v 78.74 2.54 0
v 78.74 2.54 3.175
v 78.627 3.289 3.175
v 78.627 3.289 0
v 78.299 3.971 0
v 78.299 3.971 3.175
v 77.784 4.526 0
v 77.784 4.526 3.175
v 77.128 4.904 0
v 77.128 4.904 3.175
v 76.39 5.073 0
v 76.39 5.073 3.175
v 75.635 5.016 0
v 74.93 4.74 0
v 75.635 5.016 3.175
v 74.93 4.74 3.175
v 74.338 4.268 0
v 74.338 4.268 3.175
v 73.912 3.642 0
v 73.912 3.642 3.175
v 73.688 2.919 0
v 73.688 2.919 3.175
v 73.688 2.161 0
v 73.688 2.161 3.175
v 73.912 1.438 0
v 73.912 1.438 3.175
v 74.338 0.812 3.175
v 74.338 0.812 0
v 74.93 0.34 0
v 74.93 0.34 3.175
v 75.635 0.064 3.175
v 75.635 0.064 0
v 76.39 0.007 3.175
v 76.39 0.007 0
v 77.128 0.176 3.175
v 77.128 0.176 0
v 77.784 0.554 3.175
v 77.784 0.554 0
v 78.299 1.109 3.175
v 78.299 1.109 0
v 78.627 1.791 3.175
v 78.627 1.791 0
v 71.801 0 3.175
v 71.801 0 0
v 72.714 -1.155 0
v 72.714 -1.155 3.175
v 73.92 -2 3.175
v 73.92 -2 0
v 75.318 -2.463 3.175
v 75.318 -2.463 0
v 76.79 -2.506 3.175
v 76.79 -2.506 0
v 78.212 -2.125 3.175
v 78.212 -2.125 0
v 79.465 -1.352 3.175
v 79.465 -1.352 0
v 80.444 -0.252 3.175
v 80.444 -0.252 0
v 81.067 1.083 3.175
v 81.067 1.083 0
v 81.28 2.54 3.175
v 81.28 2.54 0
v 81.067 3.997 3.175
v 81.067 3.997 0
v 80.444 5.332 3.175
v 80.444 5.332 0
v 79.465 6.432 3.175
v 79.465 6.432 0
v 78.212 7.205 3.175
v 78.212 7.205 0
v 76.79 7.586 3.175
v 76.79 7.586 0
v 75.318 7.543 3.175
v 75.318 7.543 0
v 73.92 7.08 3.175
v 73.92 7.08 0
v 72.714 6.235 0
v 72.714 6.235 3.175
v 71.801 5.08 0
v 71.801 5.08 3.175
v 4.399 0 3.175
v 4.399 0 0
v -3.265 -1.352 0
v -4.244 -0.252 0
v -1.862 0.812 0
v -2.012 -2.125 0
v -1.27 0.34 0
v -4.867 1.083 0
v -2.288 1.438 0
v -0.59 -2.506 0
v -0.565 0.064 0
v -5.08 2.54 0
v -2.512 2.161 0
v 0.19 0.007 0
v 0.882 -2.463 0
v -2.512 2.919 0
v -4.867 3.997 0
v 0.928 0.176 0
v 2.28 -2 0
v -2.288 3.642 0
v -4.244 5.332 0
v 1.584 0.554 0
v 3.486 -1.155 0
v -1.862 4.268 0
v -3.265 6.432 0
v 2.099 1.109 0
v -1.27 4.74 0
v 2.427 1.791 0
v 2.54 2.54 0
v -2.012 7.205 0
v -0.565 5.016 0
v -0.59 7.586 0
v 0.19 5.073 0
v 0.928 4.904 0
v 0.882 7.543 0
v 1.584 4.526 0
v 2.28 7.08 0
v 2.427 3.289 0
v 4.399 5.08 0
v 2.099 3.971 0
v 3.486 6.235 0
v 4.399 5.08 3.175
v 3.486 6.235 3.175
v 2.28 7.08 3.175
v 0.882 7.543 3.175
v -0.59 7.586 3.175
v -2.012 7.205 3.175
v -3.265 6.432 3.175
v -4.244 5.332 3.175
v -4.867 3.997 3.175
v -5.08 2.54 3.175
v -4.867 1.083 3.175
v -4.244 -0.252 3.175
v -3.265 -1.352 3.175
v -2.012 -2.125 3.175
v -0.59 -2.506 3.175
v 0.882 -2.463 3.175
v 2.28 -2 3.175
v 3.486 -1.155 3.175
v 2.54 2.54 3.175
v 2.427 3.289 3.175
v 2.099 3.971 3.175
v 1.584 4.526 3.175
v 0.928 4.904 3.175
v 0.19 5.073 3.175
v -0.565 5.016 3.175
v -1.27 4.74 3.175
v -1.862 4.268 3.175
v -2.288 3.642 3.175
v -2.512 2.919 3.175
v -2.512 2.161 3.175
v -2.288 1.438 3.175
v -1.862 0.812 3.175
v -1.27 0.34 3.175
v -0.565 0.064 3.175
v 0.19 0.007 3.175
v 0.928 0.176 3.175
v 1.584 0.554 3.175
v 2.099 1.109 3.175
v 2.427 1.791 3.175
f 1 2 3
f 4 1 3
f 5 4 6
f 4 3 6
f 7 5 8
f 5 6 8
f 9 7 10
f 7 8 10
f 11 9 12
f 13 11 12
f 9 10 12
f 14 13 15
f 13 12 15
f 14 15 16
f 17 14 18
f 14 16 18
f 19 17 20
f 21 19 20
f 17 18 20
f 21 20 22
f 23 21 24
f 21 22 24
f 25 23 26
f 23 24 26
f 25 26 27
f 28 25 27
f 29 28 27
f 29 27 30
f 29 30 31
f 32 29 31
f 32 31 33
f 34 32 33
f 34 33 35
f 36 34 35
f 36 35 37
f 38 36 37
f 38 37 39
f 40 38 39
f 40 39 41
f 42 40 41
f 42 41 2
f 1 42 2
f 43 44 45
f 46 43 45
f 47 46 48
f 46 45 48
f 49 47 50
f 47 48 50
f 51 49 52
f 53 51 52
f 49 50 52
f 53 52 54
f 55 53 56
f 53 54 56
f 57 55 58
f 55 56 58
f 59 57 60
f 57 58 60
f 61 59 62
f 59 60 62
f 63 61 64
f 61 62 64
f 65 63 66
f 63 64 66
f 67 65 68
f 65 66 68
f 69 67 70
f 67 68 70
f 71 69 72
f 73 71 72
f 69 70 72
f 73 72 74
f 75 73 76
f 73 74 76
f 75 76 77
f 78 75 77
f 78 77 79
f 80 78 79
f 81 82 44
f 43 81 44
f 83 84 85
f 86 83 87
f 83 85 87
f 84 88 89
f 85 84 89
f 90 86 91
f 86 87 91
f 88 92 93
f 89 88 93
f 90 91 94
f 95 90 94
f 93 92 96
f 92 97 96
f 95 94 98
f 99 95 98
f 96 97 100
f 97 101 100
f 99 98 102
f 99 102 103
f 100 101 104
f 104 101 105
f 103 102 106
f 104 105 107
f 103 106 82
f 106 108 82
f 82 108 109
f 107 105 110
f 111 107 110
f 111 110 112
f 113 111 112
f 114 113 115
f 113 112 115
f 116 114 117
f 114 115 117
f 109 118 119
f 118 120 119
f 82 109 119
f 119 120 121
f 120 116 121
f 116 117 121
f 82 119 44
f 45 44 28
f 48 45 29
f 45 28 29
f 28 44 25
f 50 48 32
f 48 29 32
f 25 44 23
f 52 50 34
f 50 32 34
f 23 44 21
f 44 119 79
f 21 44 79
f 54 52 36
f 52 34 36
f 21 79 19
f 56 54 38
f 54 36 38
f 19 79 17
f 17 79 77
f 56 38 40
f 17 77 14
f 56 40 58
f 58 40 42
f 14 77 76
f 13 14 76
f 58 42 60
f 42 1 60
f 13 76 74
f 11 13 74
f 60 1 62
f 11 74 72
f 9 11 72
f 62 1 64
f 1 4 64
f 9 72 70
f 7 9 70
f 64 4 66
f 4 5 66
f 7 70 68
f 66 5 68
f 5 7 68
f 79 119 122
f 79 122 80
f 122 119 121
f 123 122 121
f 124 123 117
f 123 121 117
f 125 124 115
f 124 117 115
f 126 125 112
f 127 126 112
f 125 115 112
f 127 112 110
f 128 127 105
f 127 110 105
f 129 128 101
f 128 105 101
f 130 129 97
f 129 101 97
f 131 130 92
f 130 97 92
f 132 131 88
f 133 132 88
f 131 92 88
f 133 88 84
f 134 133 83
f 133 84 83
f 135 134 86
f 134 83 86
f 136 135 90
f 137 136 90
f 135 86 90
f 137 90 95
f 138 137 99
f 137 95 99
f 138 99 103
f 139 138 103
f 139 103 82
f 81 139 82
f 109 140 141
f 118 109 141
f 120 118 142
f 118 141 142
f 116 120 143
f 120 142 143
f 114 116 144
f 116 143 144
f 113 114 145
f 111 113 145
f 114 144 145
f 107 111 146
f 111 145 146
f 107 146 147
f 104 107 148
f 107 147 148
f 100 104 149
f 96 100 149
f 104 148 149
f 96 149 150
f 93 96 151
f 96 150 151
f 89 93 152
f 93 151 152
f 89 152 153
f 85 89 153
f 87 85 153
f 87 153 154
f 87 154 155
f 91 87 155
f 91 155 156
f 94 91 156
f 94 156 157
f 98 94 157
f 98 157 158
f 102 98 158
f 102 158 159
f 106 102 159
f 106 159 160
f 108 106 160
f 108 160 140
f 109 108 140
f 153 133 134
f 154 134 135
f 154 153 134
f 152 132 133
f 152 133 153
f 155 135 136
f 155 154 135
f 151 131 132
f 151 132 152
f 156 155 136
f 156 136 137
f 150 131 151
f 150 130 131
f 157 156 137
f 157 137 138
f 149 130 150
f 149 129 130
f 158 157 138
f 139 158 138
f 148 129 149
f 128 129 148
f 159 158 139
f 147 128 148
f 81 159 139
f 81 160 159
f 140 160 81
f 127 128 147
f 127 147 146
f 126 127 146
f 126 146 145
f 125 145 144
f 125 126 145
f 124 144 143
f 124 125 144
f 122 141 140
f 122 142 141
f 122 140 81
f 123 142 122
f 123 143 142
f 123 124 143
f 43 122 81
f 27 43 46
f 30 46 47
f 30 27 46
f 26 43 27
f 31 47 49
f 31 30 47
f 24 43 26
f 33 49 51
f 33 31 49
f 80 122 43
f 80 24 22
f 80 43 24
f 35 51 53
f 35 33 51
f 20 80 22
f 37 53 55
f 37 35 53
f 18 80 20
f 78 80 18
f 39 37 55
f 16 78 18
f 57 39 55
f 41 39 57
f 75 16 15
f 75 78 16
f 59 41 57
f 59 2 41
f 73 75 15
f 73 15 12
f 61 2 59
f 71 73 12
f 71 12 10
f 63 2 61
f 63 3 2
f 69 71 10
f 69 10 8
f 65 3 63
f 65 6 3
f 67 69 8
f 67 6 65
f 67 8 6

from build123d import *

# Parameters (mm, degrees)
SKETCH1_R           = 5.08
SKETCH1_W           = 76.2
SKETCH1_H           = 5.08
BOSS_EXTRUDE1_DEPTH = 3.175
SKETCH2_R           = 2.54
CUT_EXTRUDE1_DEPTH  = 82.698123754


with BuildPart() as part:
    # Sketch1 → Boss-Extrude1 (new body)
    with BuildSketch(Plane.XY):
        with Locations((0, 2.54)):
            Circle(SKETCH1_R)
        with Locations((76.2, 2.54)):
            Circle(SKETCH1_R)
        with Locations((38.1, 2.54)):
            Rectangle(SKETCH1_W, SKETCH1_H)
    extrude(amount=BOSS_EXTRUDE1_DEPTH)

    # Sketch2 → Cut-Extrude1 (cut, through all)
    with BuildSketch(Plane.XY.offset(3.175)):
        with Locations((0, 2.54)):
            Circle(SKETCH2_R)
        with Locations((76.2, 2.54)):
            Circle(SKETCH2_R)
    extrude(amount=-CUT_EXTRUDE1_DEPTH, mode=Mode.SUBTRACT)


solid = part.part
